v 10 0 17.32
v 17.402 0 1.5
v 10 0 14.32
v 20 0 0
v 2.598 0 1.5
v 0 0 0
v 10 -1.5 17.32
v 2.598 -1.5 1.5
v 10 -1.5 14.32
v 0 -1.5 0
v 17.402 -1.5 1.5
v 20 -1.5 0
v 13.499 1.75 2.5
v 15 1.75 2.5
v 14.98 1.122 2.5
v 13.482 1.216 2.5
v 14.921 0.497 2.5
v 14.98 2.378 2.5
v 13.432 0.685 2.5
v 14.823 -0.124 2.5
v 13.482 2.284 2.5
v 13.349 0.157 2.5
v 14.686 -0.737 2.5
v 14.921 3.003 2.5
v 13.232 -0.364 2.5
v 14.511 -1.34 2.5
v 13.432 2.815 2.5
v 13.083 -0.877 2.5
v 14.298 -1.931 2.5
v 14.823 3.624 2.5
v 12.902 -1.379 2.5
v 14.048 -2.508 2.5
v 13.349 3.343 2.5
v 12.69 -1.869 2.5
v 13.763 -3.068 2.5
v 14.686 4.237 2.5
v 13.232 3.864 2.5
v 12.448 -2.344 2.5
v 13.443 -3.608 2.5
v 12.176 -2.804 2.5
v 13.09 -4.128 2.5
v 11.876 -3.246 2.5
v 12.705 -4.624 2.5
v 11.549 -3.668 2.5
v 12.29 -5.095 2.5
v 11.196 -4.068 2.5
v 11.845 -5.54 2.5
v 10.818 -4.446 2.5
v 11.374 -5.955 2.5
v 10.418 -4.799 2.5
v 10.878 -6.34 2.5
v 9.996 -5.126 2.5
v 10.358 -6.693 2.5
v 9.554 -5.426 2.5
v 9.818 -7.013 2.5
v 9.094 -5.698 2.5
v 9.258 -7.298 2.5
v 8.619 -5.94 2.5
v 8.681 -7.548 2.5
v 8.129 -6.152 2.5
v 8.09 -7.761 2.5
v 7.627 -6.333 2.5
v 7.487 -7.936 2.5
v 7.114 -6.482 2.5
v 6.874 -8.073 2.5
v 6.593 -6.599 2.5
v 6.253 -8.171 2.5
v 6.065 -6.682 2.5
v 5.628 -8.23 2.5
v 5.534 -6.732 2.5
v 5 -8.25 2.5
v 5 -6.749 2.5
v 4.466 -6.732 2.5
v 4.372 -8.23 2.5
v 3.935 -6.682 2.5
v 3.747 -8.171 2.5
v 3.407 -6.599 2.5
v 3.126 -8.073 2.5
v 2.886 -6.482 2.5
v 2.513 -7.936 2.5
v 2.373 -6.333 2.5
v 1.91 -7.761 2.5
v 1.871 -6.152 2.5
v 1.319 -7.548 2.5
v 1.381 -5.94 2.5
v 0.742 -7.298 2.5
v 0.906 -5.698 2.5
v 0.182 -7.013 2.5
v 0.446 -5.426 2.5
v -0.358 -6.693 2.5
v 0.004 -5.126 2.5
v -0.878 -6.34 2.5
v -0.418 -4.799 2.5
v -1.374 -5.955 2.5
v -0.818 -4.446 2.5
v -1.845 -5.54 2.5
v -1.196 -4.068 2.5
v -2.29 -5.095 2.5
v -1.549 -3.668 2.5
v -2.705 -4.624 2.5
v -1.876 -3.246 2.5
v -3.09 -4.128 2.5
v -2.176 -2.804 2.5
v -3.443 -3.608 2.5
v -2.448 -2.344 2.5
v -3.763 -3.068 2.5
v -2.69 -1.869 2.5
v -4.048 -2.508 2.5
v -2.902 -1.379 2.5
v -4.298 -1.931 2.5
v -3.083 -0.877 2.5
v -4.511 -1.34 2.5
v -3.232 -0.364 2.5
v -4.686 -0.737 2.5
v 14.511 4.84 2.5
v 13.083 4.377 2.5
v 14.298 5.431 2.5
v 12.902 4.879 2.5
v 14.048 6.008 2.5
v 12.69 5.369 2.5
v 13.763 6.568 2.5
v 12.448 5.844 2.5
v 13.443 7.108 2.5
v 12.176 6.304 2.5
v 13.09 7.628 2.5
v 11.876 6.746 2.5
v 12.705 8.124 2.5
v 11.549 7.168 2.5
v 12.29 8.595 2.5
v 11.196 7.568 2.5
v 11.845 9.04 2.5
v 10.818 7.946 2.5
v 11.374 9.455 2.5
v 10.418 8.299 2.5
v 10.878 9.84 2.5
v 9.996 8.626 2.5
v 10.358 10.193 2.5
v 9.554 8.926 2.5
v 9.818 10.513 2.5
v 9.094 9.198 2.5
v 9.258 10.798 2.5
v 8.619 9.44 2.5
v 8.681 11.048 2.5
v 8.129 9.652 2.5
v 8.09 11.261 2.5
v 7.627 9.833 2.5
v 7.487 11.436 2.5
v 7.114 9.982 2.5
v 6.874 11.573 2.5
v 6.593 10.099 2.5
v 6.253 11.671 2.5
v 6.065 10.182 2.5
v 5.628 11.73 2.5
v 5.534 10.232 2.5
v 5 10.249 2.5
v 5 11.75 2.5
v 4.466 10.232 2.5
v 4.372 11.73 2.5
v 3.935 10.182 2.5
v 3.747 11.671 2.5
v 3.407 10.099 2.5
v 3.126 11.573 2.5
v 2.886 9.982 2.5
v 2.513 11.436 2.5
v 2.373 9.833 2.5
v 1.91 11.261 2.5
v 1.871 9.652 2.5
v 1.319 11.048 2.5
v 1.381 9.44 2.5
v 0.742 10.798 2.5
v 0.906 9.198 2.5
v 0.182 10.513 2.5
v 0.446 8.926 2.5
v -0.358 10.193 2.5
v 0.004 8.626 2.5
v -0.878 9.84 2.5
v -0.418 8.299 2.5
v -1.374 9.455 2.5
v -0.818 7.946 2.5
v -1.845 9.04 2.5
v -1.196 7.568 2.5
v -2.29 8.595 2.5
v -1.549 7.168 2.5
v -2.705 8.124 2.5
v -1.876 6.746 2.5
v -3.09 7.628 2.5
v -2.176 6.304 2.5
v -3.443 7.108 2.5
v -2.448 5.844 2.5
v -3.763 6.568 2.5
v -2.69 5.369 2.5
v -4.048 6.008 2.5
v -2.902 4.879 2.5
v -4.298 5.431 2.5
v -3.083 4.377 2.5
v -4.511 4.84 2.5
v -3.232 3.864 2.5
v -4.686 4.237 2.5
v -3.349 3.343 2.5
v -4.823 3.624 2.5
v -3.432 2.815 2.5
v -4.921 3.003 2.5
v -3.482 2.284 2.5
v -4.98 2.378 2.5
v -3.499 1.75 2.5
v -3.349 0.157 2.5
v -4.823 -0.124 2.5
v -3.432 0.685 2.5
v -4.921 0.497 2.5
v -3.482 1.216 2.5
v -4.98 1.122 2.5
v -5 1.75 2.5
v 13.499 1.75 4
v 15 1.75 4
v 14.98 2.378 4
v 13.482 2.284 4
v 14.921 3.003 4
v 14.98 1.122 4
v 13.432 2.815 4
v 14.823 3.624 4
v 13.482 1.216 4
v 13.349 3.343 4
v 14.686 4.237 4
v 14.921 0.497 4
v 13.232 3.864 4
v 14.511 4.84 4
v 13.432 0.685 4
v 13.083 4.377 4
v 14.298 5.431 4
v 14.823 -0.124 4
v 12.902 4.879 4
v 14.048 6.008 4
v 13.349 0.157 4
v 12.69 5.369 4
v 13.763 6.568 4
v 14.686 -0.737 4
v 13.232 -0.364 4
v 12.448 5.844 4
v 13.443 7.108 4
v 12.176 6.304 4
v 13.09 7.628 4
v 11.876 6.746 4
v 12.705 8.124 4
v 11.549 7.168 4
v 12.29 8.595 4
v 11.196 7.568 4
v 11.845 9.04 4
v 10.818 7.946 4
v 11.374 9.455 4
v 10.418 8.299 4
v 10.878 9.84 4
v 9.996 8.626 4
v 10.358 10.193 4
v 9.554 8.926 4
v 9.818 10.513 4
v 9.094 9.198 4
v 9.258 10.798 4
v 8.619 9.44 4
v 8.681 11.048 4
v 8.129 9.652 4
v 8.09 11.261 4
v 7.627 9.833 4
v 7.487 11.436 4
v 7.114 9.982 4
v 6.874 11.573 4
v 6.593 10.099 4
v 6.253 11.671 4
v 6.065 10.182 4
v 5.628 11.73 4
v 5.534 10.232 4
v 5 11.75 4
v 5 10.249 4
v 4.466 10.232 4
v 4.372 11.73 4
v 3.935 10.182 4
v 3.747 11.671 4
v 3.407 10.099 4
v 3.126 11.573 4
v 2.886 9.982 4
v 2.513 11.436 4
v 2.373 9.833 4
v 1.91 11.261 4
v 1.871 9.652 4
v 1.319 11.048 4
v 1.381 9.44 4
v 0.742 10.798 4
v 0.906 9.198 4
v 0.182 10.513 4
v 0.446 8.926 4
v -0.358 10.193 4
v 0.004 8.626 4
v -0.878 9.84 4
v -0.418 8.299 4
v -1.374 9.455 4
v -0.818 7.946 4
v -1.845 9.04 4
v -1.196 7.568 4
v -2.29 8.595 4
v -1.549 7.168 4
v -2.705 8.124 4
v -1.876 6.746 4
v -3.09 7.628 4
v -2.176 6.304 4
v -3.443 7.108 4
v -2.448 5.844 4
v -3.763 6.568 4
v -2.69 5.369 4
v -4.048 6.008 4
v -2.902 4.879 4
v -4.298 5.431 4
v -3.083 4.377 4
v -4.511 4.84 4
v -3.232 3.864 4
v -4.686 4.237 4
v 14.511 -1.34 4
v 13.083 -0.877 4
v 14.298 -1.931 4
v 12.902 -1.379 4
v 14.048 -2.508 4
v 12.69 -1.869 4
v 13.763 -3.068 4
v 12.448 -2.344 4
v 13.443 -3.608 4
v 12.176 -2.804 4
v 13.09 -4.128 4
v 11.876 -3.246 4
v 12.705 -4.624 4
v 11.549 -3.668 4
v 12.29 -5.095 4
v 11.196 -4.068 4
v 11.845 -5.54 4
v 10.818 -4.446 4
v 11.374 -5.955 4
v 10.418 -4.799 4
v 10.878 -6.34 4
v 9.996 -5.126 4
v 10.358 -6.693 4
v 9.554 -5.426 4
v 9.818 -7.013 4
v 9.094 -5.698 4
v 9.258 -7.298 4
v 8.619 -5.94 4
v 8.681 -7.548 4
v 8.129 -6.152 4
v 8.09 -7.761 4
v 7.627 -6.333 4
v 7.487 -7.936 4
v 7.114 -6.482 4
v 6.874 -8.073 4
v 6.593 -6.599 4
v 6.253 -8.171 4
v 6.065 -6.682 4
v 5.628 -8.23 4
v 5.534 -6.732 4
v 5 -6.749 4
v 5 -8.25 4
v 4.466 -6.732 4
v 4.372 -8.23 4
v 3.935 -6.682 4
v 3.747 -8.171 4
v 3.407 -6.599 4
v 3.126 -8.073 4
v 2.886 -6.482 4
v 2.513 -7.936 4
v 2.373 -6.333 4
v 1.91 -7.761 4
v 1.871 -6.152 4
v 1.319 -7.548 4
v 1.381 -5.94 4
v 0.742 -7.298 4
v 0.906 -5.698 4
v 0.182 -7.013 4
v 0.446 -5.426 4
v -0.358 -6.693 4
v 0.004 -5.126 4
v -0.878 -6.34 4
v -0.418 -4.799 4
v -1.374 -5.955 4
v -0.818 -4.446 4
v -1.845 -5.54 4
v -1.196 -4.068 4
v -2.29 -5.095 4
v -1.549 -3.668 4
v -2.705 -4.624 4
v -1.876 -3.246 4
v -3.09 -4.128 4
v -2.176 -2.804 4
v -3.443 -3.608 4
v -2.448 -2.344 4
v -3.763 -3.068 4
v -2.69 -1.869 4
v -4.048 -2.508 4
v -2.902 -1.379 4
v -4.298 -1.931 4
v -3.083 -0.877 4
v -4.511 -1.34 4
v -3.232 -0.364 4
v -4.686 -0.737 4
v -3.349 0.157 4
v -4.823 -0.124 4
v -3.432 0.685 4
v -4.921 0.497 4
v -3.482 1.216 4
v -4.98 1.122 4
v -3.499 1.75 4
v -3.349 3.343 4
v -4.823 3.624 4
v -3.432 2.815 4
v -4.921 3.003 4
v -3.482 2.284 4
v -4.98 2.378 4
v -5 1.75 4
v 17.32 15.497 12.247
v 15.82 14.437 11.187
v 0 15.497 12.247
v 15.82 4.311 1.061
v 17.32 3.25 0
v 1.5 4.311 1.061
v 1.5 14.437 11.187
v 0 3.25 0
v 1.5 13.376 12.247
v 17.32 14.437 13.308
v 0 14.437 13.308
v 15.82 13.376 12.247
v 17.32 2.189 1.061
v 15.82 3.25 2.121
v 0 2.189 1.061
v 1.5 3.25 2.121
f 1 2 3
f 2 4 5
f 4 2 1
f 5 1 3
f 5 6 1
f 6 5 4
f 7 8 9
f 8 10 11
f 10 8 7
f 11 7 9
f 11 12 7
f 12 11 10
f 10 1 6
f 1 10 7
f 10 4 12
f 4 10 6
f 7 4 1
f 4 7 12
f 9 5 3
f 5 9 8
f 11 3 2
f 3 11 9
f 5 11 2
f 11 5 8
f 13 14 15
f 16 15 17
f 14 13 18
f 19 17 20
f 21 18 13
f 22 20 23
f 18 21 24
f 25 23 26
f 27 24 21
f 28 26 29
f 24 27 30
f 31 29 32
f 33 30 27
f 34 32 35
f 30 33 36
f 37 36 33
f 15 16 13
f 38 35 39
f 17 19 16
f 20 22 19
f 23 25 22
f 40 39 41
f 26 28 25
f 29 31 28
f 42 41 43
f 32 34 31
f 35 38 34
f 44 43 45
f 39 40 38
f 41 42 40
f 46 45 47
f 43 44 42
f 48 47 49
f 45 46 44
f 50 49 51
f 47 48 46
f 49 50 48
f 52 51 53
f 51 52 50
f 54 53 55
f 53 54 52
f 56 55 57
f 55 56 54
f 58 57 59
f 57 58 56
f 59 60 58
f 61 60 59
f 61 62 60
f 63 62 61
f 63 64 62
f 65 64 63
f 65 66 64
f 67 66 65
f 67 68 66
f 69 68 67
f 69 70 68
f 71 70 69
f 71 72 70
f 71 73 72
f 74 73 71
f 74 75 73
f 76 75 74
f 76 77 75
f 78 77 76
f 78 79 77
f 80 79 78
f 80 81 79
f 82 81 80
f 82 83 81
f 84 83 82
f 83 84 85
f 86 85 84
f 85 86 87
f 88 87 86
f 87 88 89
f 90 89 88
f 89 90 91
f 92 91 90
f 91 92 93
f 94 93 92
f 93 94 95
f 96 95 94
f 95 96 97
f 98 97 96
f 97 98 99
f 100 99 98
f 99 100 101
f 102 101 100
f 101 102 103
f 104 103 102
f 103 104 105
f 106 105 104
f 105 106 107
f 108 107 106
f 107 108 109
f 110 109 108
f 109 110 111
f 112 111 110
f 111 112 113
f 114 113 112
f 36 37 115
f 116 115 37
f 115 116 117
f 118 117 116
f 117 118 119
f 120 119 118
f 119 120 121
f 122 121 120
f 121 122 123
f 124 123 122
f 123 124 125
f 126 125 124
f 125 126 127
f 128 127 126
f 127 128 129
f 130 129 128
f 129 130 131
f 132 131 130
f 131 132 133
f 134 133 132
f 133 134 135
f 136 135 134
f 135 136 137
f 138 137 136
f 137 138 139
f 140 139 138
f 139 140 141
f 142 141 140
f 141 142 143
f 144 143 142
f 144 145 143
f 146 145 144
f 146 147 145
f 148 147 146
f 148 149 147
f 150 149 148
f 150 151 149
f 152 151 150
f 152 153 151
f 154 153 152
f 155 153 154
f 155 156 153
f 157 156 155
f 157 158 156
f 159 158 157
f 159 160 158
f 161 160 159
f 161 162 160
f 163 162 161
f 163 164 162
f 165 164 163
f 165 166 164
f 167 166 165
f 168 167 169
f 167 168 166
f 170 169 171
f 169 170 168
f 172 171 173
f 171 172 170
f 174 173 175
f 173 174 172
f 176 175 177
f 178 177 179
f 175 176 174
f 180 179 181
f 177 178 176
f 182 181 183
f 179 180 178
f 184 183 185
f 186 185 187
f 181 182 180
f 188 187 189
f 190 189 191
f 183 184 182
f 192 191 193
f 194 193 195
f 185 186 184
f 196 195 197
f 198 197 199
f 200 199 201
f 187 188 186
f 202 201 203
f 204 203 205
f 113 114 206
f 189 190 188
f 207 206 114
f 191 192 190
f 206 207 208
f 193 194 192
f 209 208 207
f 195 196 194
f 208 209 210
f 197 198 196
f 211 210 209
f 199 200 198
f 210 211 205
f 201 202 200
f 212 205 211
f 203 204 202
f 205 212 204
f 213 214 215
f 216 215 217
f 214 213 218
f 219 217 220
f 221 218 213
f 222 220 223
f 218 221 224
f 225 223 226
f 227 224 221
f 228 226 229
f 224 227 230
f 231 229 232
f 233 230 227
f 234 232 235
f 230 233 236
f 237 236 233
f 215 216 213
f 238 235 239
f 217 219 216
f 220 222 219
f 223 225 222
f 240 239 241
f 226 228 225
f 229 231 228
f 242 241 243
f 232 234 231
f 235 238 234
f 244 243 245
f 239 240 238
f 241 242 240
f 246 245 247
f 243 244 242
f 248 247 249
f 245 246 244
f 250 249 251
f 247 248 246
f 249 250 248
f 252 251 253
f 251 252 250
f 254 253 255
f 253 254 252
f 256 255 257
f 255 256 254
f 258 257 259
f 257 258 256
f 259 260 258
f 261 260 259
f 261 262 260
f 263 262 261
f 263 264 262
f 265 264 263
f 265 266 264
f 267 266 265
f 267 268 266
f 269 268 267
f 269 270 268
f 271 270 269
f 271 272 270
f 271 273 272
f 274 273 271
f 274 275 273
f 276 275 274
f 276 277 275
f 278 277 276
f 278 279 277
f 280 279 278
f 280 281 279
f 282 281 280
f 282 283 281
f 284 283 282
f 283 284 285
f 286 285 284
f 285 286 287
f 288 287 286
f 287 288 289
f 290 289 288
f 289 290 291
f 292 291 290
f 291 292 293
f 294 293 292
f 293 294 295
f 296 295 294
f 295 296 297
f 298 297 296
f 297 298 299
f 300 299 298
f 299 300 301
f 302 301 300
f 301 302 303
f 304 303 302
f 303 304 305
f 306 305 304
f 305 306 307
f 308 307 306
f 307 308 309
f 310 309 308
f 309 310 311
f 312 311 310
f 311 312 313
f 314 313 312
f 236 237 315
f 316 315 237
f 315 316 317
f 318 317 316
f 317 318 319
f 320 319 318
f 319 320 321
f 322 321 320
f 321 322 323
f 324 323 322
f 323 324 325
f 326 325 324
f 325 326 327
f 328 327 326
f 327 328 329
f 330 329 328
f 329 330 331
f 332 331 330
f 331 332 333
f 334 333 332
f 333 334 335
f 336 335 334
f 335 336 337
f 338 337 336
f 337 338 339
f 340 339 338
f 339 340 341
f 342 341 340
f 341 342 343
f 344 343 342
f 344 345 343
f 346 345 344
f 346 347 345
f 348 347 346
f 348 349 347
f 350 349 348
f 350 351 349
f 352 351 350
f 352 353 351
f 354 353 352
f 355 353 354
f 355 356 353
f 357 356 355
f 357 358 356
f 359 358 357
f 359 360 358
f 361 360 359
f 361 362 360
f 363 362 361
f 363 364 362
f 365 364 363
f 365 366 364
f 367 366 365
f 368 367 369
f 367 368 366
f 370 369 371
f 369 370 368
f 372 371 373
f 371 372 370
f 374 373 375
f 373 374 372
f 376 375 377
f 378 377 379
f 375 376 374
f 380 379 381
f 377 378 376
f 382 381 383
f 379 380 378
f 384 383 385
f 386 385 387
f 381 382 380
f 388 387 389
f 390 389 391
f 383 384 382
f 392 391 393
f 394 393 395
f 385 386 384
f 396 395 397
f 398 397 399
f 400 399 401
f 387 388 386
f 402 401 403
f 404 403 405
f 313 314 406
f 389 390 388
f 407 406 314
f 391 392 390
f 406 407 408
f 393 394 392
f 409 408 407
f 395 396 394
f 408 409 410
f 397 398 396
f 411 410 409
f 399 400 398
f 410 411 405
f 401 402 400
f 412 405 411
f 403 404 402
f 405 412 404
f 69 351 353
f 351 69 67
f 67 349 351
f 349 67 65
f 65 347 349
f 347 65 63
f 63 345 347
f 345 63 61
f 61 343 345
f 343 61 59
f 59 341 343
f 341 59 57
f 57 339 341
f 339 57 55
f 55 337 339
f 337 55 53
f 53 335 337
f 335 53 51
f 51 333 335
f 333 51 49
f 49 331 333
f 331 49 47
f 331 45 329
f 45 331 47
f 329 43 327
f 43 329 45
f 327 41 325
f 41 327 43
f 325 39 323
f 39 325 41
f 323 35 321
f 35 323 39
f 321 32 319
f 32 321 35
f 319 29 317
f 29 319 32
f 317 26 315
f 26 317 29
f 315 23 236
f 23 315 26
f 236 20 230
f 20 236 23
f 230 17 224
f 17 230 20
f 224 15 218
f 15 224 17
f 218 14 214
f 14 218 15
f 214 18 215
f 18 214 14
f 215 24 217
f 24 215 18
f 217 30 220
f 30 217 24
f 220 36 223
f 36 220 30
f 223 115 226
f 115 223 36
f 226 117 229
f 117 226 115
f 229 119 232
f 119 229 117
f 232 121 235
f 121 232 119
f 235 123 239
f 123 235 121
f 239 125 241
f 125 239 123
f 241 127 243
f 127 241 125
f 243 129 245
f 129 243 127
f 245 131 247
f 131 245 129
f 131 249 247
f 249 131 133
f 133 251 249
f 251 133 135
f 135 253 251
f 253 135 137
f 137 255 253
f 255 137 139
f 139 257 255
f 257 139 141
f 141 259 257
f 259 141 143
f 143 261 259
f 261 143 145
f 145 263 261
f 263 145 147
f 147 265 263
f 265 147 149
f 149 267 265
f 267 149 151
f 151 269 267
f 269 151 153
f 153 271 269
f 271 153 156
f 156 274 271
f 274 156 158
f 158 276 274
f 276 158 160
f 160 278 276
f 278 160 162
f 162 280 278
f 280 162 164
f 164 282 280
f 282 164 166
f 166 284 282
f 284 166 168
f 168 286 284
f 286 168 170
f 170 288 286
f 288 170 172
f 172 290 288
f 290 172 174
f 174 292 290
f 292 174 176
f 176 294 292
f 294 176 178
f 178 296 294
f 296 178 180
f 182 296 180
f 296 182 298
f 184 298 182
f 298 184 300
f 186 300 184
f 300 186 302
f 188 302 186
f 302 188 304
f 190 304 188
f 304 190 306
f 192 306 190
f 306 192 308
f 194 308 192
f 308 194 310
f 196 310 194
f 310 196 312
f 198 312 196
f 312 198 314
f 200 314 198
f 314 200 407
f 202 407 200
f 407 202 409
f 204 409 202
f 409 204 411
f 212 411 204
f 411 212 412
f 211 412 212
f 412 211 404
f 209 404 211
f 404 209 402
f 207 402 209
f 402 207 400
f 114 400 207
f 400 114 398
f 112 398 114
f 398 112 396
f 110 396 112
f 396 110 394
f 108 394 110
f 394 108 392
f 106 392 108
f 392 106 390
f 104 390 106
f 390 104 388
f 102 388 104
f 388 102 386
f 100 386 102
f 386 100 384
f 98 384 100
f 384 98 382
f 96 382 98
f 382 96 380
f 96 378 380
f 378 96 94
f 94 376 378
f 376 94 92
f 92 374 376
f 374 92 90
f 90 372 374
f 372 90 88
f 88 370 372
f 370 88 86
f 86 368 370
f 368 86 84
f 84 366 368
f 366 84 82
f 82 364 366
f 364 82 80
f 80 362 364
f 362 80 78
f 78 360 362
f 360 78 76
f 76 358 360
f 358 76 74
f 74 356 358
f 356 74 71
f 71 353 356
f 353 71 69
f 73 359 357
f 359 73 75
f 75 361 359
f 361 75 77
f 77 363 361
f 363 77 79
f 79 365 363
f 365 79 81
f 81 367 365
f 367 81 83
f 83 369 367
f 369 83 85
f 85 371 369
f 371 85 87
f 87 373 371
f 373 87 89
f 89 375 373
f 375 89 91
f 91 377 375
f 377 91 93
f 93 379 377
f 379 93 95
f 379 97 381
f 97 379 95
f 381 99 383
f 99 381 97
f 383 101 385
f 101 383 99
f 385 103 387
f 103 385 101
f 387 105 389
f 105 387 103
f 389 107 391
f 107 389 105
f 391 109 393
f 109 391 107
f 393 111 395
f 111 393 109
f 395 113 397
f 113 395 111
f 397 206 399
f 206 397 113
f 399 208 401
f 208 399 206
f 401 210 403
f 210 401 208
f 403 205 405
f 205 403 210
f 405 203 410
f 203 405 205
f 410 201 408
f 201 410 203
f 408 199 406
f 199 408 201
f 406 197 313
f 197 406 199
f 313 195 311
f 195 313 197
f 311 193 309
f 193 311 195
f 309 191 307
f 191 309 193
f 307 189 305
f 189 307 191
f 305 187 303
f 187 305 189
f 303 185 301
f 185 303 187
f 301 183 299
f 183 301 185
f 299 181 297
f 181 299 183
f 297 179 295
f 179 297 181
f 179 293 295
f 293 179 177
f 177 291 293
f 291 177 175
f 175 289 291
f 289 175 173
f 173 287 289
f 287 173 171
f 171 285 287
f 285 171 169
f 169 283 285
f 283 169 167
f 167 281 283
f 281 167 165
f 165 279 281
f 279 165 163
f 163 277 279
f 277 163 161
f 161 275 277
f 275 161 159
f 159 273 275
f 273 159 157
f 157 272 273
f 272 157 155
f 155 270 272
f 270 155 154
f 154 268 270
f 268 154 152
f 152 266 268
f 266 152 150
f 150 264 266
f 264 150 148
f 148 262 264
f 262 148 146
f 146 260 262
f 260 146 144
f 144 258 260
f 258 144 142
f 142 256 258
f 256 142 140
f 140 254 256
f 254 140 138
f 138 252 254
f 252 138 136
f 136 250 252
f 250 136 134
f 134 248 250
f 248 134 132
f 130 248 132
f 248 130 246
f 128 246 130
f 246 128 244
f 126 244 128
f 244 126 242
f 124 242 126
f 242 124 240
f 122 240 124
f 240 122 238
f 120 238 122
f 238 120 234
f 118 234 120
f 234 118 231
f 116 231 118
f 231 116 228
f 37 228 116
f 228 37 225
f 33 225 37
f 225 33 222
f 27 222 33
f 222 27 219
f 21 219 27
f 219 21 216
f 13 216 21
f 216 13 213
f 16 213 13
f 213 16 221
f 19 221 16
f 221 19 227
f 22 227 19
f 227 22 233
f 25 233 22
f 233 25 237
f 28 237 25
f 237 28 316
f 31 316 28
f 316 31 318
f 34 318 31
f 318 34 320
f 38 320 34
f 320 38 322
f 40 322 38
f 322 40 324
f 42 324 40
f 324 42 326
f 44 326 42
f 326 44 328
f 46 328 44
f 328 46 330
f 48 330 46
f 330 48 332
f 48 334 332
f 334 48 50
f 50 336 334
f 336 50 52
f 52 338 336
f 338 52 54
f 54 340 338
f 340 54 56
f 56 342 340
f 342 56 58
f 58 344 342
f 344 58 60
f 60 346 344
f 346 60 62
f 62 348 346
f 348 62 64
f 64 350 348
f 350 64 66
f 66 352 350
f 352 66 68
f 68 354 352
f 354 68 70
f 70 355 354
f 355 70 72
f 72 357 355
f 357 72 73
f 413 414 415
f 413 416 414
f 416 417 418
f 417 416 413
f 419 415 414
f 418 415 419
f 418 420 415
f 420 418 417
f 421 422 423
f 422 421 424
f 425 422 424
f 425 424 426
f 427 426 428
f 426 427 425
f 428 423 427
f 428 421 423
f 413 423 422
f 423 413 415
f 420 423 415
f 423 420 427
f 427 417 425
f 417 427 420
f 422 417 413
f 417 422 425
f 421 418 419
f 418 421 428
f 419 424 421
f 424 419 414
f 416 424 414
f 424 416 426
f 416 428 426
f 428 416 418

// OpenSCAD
// file: equilateral.scad
module equilateral(side, center=false) {
    zero = [0, 0, 0];
    shift = [-side/2, -(side / 2) * tan(30), 0];
    translate(center ? shift : zero) {
        polygon([[0, 0], [side, 0], [side/2, side * sin(60)]]);
    }
}

equilateral(10);

color("green")
translate([0, 0, -5])
equilateral(20);

color("red")
translate([0, 0, 5])
equilateral(5, center=true);
// main file
use <equilateral.scad>

thickness=1.5;
dim=20;
$fn=100;

module red_triangle() {
    color("red")
        linear_extrude(height=thickness)
        difference() {
            equilateral(dim);

            offset(r=-thickness)
                equilateral(dim);
        }
}

module white_circle() {
    color("white")
        linear_extrude(height=thickness)
        difference() {
            circle(d=dim);

            offset(r=-thickness)
                circle(d=dim);
        }
}

module blue_square() {
    color("blue")
        linear_extrude(height=thickness)
        difference() {
            square(dim * sin(60));

            offset(r=-thickness)
                square(dim * sin(60));
        }
}

rotate([90, 0, 0])
red_triangle();

translate([dim/4, thickness + 0.25, thickness + 1.0])
white_circle();

translate([0, 2*thickness + 0.25, 0])
rotate([45, 0, 0])
blue_square();
